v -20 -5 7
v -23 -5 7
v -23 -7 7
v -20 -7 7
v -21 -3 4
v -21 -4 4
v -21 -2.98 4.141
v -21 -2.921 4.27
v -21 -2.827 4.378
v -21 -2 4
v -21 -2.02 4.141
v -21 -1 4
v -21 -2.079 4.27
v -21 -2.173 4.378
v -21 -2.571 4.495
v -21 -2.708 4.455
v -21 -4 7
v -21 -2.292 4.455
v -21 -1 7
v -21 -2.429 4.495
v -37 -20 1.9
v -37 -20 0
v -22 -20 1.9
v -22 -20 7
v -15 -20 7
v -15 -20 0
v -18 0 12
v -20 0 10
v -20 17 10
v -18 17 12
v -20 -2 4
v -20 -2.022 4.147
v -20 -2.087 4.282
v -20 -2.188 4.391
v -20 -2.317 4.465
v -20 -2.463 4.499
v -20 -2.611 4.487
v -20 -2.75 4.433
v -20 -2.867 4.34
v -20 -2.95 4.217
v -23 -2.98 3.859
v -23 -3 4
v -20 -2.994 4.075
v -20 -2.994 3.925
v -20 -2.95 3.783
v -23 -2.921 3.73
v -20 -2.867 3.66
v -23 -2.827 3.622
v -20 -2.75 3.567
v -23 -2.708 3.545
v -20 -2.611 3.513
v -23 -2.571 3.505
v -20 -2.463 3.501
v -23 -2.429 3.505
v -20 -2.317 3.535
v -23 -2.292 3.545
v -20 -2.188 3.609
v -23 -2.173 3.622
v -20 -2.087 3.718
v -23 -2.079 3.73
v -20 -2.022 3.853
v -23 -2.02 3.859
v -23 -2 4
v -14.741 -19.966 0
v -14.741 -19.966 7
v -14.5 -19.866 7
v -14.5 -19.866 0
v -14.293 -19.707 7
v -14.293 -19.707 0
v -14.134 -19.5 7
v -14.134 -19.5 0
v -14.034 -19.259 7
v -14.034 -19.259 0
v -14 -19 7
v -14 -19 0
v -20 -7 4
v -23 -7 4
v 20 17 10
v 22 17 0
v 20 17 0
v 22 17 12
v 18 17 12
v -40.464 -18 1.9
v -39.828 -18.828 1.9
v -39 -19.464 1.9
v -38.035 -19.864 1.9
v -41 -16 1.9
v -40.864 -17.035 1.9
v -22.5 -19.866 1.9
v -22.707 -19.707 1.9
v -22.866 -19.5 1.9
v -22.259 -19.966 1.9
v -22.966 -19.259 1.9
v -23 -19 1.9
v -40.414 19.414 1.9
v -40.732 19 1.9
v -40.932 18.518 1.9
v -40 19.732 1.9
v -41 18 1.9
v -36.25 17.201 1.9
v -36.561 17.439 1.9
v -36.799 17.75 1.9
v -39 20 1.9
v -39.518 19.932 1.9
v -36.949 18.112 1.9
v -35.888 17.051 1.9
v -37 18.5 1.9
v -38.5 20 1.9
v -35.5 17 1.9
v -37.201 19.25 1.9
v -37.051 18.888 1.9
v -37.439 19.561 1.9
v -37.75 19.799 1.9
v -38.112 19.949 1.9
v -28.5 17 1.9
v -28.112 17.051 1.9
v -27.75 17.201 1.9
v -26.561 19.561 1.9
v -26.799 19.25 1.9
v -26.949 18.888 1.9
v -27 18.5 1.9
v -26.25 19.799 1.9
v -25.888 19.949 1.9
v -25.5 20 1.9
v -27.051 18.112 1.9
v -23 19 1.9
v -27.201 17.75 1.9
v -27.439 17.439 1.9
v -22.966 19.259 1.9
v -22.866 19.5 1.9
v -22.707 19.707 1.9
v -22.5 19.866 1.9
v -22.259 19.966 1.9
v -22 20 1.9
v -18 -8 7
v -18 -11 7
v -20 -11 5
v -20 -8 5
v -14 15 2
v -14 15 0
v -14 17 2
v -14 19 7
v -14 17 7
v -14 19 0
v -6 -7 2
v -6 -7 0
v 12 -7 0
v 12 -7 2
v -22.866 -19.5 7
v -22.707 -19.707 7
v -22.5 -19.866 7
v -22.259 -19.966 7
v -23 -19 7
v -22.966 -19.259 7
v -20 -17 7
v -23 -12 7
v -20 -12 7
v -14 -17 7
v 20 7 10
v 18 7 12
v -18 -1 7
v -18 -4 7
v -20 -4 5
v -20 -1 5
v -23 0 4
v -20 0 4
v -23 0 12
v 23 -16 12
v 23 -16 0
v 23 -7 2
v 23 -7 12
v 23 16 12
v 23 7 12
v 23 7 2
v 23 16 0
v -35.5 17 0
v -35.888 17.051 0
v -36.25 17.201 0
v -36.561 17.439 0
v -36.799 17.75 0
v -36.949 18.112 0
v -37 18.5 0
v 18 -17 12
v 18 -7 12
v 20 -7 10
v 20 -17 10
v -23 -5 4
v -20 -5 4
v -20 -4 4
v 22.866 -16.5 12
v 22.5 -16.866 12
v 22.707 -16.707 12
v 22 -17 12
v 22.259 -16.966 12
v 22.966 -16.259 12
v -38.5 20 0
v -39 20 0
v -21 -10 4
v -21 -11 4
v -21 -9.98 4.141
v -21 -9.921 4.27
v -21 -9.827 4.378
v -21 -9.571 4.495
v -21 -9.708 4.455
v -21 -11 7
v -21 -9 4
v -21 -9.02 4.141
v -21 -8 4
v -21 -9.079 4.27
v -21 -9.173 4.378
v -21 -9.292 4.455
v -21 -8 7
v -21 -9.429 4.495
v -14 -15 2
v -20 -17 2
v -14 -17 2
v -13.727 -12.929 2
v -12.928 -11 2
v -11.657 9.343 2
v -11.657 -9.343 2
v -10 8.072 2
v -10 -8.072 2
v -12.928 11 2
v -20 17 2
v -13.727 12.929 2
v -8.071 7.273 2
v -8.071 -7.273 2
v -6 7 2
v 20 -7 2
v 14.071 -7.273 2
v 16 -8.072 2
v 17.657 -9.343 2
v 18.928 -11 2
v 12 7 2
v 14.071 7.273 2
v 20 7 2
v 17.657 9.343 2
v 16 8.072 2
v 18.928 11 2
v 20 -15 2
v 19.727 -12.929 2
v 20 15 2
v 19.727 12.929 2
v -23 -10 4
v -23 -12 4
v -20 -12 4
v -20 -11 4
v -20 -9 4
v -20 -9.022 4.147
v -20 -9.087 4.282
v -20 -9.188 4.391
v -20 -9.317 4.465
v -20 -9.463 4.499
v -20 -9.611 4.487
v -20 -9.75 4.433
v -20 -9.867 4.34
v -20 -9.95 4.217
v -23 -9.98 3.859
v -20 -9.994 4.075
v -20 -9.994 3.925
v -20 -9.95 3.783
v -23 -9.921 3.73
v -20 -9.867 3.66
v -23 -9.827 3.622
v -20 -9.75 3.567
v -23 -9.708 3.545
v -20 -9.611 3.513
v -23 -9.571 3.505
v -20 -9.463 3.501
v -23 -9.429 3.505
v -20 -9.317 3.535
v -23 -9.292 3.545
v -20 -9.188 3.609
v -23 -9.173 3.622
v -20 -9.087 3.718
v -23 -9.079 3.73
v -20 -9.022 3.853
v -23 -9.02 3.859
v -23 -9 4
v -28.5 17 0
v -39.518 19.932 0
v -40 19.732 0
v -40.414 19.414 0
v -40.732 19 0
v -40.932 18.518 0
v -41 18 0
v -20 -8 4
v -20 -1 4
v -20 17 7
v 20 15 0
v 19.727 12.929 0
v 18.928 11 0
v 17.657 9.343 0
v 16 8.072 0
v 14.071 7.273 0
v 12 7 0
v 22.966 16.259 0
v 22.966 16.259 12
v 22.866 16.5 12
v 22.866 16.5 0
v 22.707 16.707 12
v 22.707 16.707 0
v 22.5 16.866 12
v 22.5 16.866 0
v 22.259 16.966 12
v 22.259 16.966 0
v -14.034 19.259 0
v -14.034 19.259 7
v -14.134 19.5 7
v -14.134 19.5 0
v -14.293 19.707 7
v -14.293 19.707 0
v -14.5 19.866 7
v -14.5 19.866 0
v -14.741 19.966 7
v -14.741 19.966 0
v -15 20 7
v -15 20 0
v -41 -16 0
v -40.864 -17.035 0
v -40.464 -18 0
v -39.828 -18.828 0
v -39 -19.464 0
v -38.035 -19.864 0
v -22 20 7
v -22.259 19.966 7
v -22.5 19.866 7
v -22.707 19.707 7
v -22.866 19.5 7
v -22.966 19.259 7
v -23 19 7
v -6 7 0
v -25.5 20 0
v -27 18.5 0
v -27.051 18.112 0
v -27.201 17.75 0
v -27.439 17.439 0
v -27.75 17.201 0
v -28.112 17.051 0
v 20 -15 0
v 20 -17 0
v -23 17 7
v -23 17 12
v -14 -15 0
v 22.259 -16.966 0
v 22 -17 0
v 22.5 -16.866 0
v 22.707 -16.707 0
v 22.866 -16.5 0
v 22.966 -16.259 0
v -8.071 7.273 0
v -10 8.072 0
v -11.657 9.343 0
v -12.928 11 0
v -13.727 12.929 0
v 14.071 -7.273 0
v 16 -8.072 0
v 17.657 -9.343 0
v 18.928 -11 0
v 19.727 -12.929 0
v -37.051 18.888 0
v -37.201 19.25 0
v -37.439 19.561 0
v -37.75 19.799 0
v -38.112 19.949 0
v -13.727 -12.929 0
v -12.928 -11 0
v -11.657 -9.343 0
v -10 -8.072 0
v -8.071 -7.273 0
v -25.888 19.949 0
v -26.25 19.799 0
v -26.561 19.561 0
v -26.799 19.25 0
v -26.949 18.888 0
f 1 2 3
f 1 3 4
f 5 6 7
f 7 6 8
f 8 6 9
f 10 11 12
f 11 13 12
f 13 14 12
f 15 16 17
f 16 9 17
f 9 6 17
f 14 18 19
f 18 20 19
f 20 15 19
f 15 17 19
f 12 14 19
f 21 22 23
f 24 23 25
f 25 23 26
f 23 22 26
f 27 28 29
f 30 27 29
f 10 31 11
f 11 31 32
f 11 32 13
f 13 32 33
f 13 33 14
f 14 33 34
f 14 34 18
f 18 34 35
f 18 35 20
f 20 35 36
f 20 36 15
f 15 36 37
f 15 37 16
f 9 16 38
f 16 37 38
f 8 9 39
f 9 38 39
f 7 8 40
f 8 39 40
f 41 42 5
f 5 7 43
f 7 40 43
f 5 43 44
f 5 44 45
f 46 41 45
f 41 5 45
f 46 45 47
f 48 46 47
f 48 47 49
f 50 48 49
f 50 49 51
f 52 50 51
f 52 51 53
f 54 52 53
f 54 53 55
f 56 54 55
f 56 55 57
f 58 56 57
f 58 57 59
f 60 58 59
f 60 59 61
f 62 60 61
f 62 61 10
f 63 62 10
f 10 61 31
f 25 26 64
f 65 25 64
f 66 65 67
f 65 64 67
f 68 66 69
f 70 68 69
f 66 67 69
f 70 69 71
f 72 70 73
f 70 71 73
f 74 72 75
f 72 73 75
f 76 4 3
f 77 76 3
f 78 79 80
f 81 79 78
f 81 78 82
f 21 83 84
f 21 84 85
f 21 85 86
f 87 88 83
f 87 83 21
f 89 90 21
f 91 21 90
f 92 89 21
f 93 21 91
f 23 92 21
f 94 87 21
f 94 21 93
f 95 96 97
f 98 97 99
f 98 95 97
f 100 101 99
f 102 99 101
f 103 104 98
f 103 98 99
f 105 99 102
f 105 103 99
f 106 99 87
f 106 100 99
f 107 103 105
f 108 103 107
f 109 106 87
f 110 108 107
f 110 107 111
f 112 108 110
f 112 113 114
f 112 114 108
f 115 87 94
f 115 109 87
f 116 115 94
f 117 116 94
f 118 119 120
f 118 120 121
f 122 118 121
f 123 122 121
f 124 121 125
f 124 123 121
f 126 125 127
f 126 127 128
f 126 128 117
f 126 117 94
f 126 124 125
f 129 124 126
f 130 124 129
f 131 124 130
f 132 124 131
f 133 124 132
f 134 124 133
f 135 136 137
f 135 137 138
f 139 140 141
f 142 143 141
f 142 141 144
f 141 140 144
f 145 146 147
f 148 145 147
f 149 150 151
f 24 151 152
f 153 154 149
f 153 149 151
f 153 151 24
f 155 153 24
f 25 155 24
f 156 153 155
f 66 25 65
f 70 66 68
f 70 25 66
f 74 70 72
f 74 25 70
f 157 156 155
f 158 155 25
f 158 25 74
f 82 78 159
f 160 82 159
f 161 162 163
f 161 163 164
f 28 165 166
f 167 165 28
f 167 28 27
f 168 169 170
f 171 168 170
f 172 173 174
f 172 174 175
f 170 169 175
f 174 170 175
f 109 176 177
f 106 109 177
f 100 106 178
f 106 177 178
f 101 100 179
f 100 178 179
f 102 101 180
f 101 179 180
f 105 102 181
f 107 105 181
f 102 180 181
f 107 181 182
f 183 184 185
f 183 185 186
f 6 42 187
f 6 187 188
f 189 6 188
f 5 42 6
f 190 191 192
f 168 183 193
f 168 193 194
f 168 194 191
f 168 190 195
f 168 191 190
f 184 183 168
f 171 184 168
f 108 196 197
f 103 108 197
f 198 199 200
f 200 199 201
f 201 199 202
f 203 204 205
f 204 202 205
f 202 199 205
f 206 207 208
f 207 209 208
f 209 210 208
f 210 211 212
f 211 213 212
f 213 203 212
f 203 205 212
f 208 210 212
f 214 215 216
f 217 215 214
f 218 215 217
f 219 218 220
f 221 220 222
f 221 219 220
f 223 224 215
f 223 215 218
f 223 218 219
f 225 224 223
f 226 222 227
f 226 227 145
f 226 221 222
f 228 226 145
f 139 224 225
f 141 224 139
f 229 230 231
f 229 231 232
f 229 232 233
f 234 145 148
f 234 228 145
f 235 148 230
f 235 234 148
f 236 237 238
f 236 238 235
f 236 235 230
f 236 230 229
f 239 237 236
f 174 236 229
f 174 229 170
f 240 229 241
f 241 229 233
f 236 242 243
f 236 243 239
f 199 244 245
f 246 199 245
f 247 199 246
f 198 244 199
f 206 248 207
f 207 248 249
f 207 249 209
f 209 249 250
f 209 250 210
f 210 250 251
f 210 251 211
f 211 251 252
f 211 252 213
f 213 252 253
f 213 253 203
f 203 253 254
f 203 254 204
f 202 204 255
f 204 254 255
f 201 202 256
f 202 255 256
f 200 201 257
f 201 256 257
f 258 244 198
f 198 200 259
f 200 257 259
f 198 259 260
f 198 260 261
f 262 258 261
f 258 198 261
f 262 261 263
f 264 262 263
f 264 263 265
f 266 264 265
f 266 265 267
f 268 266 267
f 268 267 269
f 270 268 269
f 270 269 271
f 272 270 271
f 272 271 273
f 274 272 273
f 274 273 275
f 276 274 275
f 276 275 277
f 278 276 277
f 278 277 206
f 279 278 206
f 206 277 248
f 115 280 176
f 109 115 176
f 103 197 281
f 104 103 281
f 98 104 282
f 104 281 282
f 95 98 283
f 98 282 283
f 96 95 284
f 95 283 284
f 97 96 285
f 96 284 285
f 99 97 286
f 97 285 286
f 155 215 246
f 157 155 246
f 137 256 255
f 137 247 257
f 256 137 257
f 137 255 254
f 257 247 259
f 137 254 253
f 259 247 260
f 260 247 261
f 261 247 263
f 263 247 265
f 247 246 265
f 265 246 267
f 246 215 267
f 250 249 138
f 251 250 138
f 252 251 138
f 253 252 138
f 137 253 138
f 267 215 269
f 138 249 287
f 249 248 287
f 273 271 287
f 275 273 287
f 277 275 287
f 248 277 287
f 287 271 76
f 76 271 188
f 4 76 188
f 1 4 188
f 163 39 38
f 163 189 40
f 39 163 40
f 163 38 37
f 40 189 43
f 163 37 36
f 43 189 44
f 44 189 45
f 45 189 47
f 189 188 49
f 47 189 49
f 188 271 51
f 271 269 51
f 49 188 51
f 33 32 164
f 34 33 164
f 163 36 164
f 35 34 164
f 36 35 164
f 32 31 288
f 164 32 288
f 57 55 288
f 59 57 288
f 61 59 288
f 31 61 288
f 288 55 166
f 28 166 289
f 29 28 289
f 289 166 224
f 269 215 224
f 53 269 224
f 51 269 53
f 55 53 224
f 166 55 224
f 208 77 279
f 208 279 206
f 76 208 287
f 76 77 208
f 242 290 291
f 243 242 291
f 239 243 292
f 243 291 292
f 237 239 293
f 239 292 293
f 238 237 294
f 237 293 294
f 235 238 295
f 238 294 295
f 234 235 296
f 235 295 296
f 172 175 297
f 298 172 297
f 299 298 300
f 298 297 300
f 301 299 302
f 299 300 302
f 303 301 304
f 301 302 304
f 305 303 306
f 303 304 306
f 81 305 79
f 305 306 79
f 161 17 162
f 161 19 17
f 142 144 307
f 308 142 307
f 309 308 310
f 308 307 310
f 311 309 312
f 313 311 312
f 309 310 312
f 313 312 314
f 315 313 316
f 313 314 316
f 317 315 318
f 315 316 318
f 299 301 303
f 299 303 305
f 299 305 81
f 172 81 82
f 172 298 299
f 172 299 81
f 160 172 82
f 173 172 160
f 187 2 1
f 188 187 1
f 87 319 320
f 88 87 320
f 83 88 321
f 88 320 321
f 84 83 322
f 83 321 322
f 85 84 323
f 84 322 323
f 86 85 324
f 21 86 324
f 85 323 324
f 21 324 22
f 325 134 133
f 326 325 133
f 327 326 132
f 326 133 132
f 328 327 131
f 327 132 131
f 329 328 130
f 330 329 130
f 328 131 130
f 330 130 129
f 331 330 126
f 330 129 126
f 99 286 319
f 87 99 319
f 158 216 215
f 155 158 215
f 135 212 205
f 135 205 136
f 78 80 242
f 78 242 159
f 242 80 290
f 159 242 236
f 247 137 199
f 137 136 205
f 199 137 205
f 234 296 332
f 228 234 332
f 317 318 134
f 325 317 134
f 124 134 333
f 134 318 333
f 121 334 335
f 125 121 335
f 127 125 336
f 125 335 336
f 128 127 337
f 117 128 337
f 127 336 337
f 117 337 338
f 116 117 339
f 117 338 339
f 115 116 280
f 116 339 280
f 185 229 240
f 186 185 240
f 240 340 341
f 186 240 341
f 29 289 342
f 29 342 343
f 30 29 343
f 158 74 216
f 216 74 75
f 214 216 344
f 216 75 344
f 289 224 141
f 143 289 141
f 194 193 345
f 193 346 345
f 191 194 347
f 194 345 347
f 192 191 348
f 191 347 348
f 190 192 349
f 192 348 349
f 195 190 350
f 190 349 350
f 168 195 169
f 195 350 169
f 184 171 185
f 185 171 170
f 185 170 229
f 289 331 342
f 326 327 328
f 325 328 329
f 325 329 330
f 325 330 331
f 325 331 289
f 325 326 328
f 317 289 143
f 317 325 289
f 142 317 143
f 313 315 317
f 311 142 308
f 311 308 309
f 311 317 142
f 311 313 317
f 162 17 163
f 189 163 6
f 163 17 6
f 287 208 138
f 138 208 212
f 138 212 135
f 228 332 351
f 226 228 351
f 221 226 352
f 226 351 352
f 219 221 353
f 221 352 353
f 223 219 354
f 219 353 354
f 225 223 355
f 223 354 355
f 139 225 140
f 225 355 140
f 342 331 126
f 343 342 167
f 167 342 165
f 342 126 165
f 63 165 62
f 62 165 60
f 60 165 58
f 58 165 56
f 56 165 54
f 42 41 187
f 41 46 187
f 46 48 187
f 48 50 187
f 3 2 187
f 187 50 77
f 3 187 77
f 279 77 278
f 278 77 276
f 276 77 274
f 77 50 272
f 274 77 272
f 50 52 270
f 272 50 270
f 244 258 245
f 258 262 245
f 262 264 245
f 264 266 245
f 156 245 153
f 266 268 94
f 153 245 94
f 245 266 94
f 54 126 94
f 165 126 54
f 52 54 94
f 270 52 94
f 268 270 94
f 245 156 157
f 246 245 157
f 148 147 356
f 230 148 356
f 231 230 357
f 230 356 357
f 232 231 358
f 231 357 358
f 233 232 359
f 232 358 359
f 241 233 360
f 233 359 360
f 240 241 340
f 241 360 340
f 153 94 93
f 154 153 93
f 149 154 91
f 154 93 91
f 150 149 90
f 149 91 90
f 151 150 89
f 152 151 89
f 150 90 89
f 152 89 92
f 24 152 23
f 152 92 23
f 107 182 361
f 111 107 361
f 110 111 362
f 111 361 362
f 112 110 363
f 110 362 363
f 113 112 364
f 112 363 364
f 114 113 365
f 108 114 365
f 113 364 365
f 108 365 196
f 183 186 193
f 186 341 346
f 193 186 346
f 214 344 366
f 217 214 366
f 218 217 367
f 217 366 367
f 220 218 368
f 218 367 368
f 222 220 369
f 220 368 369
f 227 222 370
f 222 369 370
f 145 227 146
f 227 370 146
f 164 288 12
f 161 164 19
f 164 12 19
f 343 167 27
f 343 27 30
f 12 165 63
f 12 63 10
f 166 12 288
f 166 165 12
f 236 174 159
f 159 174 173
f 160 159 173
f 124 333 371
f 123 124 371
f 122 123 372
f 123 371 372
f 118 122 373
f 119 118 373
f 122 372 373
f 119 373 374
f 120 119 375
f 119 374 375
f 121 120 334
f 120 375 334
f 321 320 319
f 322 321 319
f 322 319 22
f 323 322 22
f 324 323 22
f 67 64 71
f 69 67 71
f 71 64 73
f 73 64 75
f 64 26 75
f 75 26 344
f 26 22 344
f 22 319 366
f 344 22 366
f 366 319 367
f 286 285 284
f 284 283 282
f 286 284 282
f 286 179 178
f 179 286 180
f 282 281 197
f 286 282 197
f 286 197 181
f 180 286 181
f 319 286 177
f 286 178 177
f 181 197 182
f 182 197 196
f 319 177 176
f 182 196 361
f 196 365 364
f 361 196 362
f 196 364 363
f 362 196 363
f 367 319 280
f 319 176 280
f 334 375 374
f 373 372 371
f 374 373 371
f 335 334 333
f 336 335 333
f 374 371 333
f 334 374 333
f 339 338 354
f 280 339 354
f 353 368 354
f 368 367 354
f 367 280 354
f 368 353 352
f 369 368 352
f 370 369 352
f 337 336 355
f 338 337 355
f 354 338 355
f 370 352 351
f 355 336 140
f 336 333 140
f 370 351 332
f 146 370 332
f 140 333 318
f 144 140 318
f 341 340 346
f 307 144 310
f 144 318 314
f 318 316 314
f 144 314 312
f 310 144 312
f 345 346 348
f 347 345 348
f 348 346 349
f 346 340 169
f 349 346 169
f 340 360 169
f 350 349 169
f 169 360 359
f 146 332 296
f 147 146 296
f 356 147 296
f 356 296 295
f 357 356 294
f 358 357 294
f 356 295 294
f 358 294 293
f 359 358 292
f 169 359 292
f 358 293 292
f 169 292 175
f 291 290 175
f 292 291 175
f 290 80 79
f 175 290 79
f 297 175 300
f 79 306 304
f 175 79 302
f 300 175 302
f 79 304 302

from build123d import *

# Parameters (mm, degrees)
F1_DEPTH  = 2
F2_W      = 3
F2_H      = 17
F3_DEPTH  = 10
F4_W      = 10
F4_H      = 2
F5_DEPTH  = 2
F6_SIZE   = 1.99999
F2_H_2    = 10
F2_H_3    = 7
F7_DEPTH  = 5
F8_DEPTH  = 7
F9_W      = 17
F9_H      = 2
F10_DEPTH = 2
F11_SIZE  = 1.99999
F14_DEPTH = 2
F15_SIZE  = 1.99999
F17_DEPTH = 3
F18_R     = 0.5
F19_DEPTH = 3.001
F21_DEPTH = 1.9


# Not quite as in the source:
# - a fillet or chamfer is up to 0.001 mm smaller than in the source, because OpenCascade refuses the exact size
# - a feature names something its author has since deleted; it is built from what else it names


with BuildPart() as f1:
    # F0 (on Top) → F1 (new body)
    with BuildSketch(Plane.XY):
        with BuildLine():
            Line((-14, 17), (-15, 17))
            Line((-15, 17), (-20, 17))
            Line((-20, 17), (-20, -15))
            Line((-20, -15), (-20, -17))
            Line((-20, -17), (-15, -17))
            Line((-15, -17), (-14, -17))
            Line((-14, -17), (-14, -15))
            ThreePointArc((-14, -15), (-11.6568542495, -9.3431457505), (-6, -7))
            Line((-6, -7), (12, -7))
            ThreePointArc((12, -7), (17.6568542495, -9.3431457505), (20, -15))
            Line((20, -15), (20, 15))
            ThreePointArc((20, 15), (17.6568542495, 9.3431457505), (12, 7))
            Line((12, 7), (-6, 7))
            ThreePointArc((-6, 7), (-11.6568542495, 9.3431457505), (-14, 15))
            Line((-14, 15), (-14, 17))
        make_face()
        Polygon((-20, -15), (-20, 17), (-23, 17), (-23, -17), (-20, -17), align=None)
        with BuildLine():
            Line((22, 17), (20, 17))
            Line((20, 17), (20, 15))
            Line((20, 15), (20, -15))
            Line((20, -15), (20, -17))
            Line((20, -17), (22, -17))
            ThreePointArc((22, -17), (22.7071067812, -16.7071067812), (23, -16))
            Line((23, -16), (23, 16))
            ThreePointArc((23, 16), (22.7071067812, 16.7071067812), (22, 17))
        make_face()
    extrude(amount=F1_DEPTH)

    # F2 (on face) → F3 (join)
    with BuildSketch(Plane.XY.offset(2)):
        with BuildLine():
            Line((20, -7), (20, -15))
            Line((20, -15), (20, -17))
            Line((20, -17), (22, -17))
            ThreePointArc((22, -17), (22.7071067812, -16.7071067812), (23, -16))
            Line((23, -16), (23, -7))
            Line((23, -7), (20, -7))
        make_face()
        with BuildLine():
            Line((20, 15), (20, 7))
            Line((20, 7), (23, 7))
            Line((23, 7), (23, 16))
            ThreePointArc((23, 16), (22.7071067812, 16.7071067812), (22, 17))
            Line((22, 17), (20, 17))
            Line((20, 17), (20, 15))
        make_face()
        with Locations((-21.5, 8.5)):
            Rectangle(F2_W, F2_H)
    extrude(amount=F3_DEPTH)

    # F4 (on face) → F5 (join)
    with BuildSketch(Plane(origin=(20, 0, 0), x_dir=(0, -1, 0), z_dir=(-1, 0, 0))):
        with Locations((-12, 11)):
            Rectangle(F4_W, F4_H)
        with Locations((12, 11)):
            Rectangle(F4_W, F4_H)
    extrude(amount=F5_DEPTH)

    # F6 (size 2 in the source; OpenCascade refuses exactly that, so slightly less here)
    f6_edges = [f1.edges().sort_by_distance(p)[0] for p in [
        (18, 12, 10),
        (18, -12, 10),
    ]]
    chamfer(f6_edges, length=F6_SIZE)

    # F2 (on face) → F7 (join)
    with BuildSketch(Plane.XY.offset(2)):
        with Locations((-21.5, -12)):
            Rectangle(F2_W, F2_H_2)
        with Locations((-21.5, -3.5)):
            Rectangle(F2_W, F2_H_3)
    extrude(amount=F7_DEPTH)

    # F0 (on Top) → F8 (join)
    with BuildSketch(Plane.XY):
        with BuildLine():
            Line((-15, -17), (-20, -17))
            Line((-20, -17), (-23, -17))
            Line((-23, -17), (-23, -19))
            ThreePointArc((-23, -19), (-22.7071067812, -19.7071067812), (-22, -20))
            Line((-22, -20), (-15, -20))
            ThreePointArc((-15, -20), (-14.2928932188, -19.7071067812), (-14, -19))
            Line((-14, -19), (-14, -18))
            Line((-14, -18), (-14, -17))
            Line((-14, -17), (-15, -17))
        make_face()
        with BuildLine():
            Line((-20, 17), (-15, 17))
            Line((-15, 17), (-14, 17))
            Line((-14, 17), (-14, 18))
            Line((-14, 18), (-14, 19))
            ThreePointArc((-14, 19), (-14.2928932188, 19.7071067812), (-15, 20))
            Line((-15, 20), (-22, 20))
            ThreePointArc((-22, 20), (-22.7071067812, 19.7071067812), (-23, 19))
            Line((-23, 19), (-23, 17))
            Line((-23, 17), (-20, 17))
        make_face()
    extrude(amount=F8_DEPTH)

    # F9 (on face) → F10 (join)
    with BuildSketch(Plane.YZ.offset(-20)):
        with Locations((8.5, 11)):
            Rectangle(F9_W, F9_H)
    extrude(amount=F10_DEPTH)

    # F11 (size 2 in the source; OpenCascade refuses exactly that, so slightly less here)
    f11_edges = [f1.edges().sort_by_distance(p)[0] for p in [
        (-18, 8.5, 10),
    ]]
    chamfer(f11_edges, length=F11_SIZE)

    # F13 (on face) → F14 (join)
    with BuildSketch(Plane.YZ.offset(-20)):
        Polygon((-9.5, 7), (-11, 7), (-11, 5), (-8, 5), (-8, 7), align=None)
        Polygon((-1, 5), (-1, 7), (-2.5, 7), (-4, 7), (-4, 5), align=None)
    extrude(amount=F14_DEPTH)

    # F15 (size 2 in the source; OpenCascade refuses exactly that, so slightly less here)
    f15_edges = [f1.edges().sort_by_distance(p)[0] for p in [
        (-18, -9.5, 5),
        (-18, -2.5, 5),
    ]]
    chamfer(f15_edges, length=F15_SIZE)

    # F16 (on face) → F17 (cut)
    with BuildSketch(Plane.XY.offset(7)):
        Polygon((-23, 0), (-23, -1), (-23, -4), (-21, -4), (-21, -1), (-20, -1), (-20, 0), align=None)
        Polygon((-21, -4), (-23, -4), (-23, -5), (-20, -5), (-20, -4), align=None)
        Polygon((-21, -8), (-23, -8), (-23, -11), (-23, -12), (-21, -12), (-20, -12), (-20, -11), (-21, -11), align=None)
        Polygon((-21, -7), (-23, -7), (-23, -8), (-21, -8), (-20, -8), (-20, -7), align=None)
    extrude(amount=-F17_DEPTH, mode=Mode.SUBTRACT)

    # F18 (on face) → F19 (cut, through all)
    with BuildSketch(Plane.YZ.offset(-20)):
        with Locations((-9.5, 4)):
            Circle(F18_R)
        with Locations((-2.5, 4)):
            Circle(F18_R)
    extrude(amount=-F19_DEPTH, mode=Mode.SUBTRACT)

    # F20 (on Top) → F21 (join)
    with BuildSketch(Plane.XY):
        with BuildLine():
            Line((-23, -19), (-23, -17))
            Line((-23, -17), (-23, 17))
            Line((-23, 17), (-23, 19))
            Line((-23, 19), (-23, 20))
            Line((-23, 20), (-25.5, 20))
            ThreePointArc((-25.5, 20), (-26.5606601718, 19.5606601718), (-27, 18.5))
            ThreePointArc((-27, 18.5), (-27.4393398282, 17.4393398282), (-28.5, 17))
            Line((-28.5, 17), (-35.5, 17))
            ThreePointArc((-35.5, 17), (-36.5606601718, 17.4393398282), (-37, 18.5))
            ThreePointArc((-37, 18.5), (-37.4393398282, 19.5606601718), (-38.5, 20))
            Line((-38.5, 20), (-39, 20))
            ThreePointArc((-39, 20), (-40.4142135624, 19.4142135624), (-41, 18))
            Line((-41, 18), (-41, 16))
            Line((-41, 16), (-41, -16))
            ThreePointArc((-41, -16), (-39.8284271247, -18.8284271247), (-37, -20))
            Line((-37, -20), (-23, -20))
            Line((-23, -20), (-23, -19))
        make_face()
        with BuildLine():
            Line((-23, 20), (-23, 19))
            ThreePointArc((-23, 19), (-22.7071067812, 19.7071067812), (-22, 20))
            Line((-22, 20), (-23, 20))
        make_face()
        with BuildLine():
            ThreePointArc((-22, -20), (-22.7071067812, -19.7071067812), (-23, -19))
            Line((-23, -19), (-23, -20))
            Line((-23, -20), (-22, -20))
        make_face()
    extrude(amount=F21_DEPTH)


solid = f1.part
